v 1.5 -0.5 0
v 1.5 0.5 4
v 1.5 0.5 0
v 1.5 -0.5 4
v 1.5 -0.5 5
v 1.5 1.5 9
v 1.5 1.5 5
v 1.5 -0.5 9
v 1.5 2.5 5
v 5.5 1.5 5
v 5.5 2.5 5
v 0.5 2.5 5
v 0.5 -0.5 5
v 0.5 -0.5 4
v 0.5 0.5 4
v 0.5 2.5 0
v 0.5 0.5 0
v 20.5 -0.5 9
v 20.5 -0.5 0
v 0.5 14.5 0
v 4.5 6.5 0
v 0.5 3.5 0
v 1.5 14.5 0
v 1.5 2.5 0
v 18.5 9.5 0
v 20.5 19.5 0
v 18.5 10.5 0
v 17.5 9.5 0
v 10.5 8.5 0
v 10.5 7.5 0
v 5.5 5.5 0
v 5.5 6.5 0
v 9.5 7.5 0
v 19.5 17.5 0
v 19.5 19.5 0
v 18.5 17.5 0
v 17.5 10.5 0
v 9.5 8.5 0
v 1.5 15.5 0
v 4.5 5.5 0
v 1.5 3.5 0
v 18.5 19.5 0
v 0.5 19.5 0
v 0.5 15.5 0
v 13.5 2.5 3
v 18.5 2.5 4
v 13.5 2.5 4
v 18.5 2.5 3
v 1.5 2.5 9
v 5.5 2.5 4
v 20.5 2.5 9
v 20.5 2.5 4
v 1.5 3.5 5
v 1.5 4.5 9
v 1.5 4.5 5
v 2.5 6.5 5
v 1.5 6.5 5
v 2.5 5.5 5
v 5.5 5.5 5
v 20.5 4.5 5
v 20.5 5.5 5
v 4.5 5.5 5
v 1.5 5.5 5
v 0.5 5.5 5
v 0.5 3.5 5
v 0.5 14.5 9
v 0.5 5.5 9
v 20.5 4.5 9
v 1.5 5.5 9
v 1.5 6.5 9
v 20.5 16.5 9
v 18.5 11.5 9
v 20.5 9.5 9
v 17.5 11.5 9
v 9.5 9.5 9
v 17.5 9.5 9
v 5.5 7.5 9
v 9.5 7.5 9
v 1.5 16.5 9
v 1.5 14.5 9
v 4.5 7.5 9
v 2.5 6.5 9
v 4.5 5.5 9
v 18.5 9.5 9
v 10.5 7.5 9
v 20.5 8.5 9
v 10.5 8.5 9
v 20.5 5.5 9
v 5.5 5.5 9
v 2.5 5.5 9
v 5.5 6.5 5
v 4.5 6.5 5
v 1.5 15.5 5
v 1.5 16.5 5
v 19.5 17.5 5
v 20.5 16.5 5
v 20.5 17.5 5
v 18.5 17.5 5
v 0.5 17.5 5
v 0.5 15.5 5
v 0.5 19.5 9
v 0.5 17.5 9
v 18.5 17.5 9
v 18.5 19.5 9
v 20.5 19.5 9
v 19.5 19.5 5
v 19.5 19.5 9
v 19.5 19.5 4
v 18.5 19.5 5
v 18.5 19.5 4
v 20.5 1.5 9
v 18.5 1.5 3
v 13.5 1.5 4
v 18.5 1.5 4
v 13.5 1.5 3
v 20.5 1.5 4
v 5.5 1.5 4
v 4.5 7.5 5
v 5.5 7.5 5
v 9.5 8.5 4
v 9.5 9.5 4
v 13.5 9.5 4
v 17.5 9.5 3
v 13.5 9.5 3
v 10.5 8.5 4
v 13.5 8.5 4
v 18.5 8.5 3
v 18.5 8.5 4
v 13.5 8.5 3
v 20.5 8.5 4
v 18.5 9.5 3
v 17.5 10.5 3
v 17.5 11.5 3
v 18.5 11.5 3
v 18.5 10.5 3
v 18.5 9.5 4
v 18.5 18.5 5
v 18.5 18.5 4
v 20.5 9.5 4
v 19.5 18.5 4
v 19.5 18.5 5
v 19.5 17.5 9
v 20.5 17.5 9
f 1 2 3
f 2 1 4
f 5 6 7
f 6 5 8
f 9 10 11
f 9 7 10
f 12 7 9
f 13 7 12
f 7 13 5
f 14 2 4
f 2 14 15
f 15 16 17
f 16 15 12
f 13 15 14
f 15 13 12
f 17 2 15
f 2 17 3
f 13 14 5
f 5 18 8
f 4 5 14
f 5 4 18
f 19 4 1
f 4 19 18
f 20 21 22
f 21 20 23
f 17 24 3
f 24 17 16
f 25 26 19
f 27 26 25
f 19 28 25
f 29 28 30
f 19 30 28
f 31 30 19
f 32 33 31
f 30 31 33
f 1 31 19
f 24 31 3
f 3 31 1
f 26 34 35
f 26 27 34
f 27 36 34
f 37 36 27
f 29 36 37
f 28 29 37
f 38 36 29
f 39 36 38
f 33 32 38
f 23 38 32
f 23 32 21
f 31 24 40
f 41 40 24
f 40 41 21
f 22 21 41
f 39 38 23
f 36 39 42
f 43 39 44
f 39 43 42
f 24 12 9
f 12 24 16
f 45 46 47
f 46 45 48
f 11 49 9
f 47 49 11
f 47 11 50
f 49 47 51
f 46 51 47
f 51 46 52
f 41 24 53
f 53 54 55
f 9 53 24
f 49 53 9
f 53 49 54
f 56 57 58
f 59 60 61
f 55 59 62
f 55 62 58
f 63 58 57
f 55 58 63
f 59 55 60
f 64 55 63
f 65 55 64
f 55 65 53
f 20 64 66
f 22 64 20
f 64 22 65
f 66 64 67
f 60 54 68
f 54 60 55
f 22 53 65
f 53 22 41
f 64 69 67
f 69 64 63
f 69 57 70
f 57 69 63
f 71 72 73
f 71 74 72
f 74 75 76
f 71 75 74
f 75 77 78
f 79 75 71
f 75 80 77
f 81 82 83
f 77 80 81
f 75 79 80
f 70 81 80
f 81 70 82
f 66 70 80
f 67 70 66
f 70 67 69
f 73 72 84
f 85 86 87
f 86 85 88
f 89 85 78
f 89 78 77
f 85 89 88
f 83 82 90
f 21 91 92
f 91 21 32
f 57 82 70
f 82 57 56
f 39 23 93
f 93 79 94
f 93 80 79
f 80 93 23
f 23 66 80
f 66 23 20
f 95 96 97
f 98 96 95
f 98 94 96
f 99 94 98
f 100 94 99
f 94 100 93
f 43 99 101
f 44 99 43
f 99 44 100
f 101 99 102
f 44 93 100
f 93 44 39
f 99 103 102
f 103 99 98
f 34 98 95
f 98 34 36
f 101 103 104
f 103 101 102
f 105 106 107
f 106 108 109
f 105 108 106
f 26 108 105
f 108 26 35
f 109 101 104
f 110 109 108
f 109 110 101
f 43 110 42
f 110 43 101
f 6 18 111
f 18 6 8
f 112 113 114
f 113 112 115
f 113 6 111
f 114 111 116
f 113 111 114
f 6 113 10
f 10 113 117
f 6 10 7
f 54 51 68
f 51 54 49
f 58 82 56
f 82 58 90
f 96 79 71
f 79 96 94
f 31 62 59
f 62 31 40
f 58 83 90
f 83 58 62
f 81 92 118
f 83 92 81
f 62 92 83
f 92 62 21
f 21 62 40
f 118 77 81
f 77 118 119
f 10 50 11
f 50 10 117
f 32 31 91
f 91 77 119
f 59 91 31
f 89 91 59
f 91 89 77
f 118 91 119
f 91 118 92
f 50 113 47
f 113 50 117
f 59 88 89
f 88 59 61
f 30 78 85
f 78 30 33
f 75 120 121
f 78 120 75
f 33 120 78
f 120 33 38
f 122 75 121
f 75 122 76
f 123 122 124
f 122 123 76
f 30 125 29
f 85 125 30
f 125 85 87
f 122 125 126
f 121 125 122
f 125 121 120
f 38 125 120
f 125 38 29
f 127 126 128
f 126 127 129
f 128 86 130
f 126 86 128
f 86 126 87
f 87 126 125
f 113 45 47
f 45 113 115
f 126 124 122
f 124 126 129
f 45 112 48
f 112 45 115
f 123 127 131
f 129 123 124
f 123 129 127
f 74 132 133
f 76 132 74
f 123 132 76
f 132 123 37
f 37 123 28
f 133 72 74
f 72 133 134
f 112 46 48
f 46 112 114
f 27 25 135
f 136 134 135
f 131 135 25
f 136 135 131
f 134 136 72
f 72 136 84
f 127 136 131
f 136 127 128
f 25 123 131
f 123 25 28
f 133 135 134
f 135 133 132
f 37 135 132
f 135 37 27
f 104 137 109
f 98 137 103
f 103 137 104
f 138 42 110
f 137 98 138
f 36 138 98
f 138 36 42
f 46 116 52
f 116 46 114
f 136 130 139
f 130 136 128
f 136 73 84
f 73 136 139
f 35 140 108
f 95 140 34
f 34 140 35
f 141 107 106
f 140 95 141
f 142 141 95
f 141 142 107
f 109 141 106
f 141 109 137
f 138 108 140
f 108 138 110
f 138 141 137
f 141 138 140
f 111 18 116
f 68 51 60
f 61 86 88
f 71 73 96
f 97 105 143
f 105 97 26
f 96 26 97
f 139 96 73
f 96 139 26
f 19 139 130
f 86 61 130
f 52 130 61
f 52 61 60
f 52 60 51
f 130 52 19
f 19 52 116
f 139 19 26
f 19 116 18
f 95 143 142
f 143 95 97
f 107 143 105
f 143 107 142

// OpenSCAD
union() {
    translate([1, 0, 4.5]) color([1, 0, 0]) cube([1, 1, 1], center=true);
    translate([1, 1, 2.5]) cube([1, 1, 5], center=true);
    translate([1, 2, 2.5]) cube([1, 1, 5], center=true);
    translate([1, 4, 2.5]) cube([1, 1, 5], center=true);
    translate([1, 5, 2.5]) cube([1, 1, 5], center=true);
    translate([1, 6, 4.5]) cube([1, 1, 9], center=true);
    translate([1, 7, 4.5]) cube([1, 1, 9], center=true);
    translate([1, 8, 4.5]) cube([1, 1, 9], center=true);
    translate([1, 9, 4.5]) cube([1, 1, 9], center=true);
    translate([1, 10, 4.5]) cube([1, 1, 9], center=true);
    translate([1, 11, 4.5]) cube([1, 1, 9], center=true);
    translate([1, 12, 4.5]) cube([1, 1, 9], center=true);
    translate([1, 13, 4.5]) cube([1, 1, 9], center=true);
    translate([1, 14, 4.5]) cube([1, 1, 9], center=true);
    translate([1, 16, 2.5]) cube([1, 1, 5], center=true);
    translate([1, 17, 2.5]) cube([1, 1, 5], center=true);
    translate([1, 18, 4.5]) cube([1, 1, 9], center=true);
    translate([1, 19, 4.5]) cube([1, 1, 9], center=true);
    translate([2, 0, 4.5]) cube([1, 1, 9], center=true);
    translate([2, 1, 4.5]) cube([1, 1, 9], center=true);
    translate([2, 2, 2.5]) cube([1, 1, 5], center=true);
    translate([2, 3, 4.5]) cube([1, 1, 9], center=true);
    translate([2, 4, 4.5]) cube([1, 1, 9], center=true);
    translate([2, 5, 2.5]) cube([1, 1, 5], center=true);
    translate([2, 6, 2.5]) cube([1, 1, 5], center=true);
    translate([2, 7, 4.5]) cube([1, 1, 9], center=true);
    translate([2, 8, 4.5]) cube([1, 1, 9], center=true);
    translate([2, 9, 4.5]) cube([1, 1, 9], center=true);
    translate([2, 10, 4.5]) cube([1, 1, 9], center=true);
    translate([2, 11, 4.5]) cube([1, 1, 9], center=true);
    translate([2, 12, 4.5]) cube([1, 1, 9], center=true);
    translate([2, 13, 4.5]) cube([1, 1, 9], center=true);
    translate([2, 14, 4.5]) cube([1, 1, 9], center=true);
    translate([2, 15, 4.5]) cube([1, 1, 9], center=true);
    translate([2, 16, 4.5]) cube([1, 1, 9], center=true);
    translate([2, 17, 2.5]) cube([1, 1, 5], center=true);
    translate([2, 18, 4.5]) cube([1, 1, 9], center=true);
    translate([2, 19, 4.5]) cube([1, 1, 9], center=true);
    translate([3, 0, 4.5]) cube([1, 1, 9], center=true);
    translate([3, 1, 4.5]) cube([1, 1, 9], center=true);
    translate([3, 2, 2.5]) cube([1, 1, 5], center=true);
    translate([3, 3, 4.5]) cube([1, 1, 9], center=true);
    translate([3, 4, 4.5]) cube([1, 1, 9], center=true);
    translate([3, 5, 2.5]) cube([1, 1, 5], center=true);
    translate([3, 6, 4.5]) cube([1, 1, 9], center=true);
    translate([3, 7, 4.5]) cube([1, 1, 9], center=true);
    translate([3, 8, 4.5]) cube([1, 1, 9], center=true);
    translate([3, 9, 4.5]) cube([1, 1, 9], center=true);
    translate([3, 10, 4.5]) cube([1, 1, 9], center=true);
    translate([3, 11, 4.5]) cube([1, 1, 9], center=true);
    translate([3, 12, 4.5]) cube([1, 1, 9], center=true);
    translate([3, 13, 4.5]) cube([1, 1, 9], center=true);
    translate([3, 14, 4.5]) cube([1, 1, 9], center=true);
    translate([3, 15, 4.5]) cube([1, 1, 9], center=true);
    translate([3, 16, 4.5]) cube([1, 1, 9], center=true);
    translate([3, 17, 2.5]) cube([1, 1, 5], center=true);
    translate([3, 18, 4.5]) cube([1, 1, 9], center=true);
    translate([3, 19, 4.5]) cube([1, 1, 9], center=true);
    translate([4, 0, 4.5]) cube([1, 1, 9], center=true);
    translate([4, 1, 4.5]) cube([1, 1, 9], center=true);
    translate([4, 2, 2.5]) cube([1, 1, 5], center=true);
    translate([4, 3, 4.5]) cube([1, 1, 9], center=true);
    translate([4, 4, 4.5]) cube([1, 1, 9], center=true);
    translate([4, 5, 2.5]) cube([1, 1, 5], center=true);
    translate([4, 6, 4.5]) cube([1, 1, 9], center=true);
    translate([4, 7, 4.5]) cube([1, 1, 9], center=true);
    translate([4, 8, 4.5]) cube([1, 1, 9], center=true);
    translate([4, 9, 4.5]) cube([1, 1, 9], center=true);
    translate([4, 10, 4.5]) cube([1, 1, 9], center=true);
    translate([4, 11, 4.5]) cube([1, 1, 9], center=true);
    translate([4, 12, 4.5]) cube([1, 1, 9], center=true);
    translate([4, 13, 4.5]) cube([1, 1, 9], center=true);
    translate([4, 14, 4.5]) cube([1, 1, 9], center=true);
    translate([4, 15, 4.5]) cube([1, 1, 9], center=true);
    translate([4, 16, 4.5]) cube([1, 1, 9], center=true);
    translate([4, 17, 2.5]) cube([1, 1, 5], center=true);
    translate([4, 18, 4.5]) cube([1, 1, 9], center=true);
    translate([4, 19, 4.5]) cube([1, 1, 9], center=true);
    translate([5, 0, 4.5]) cube([1, 1, 9], center=true);
    translate([5, 1, 4.5]) cube([1, 1, 9], center=true);
    translate([5, 2, 2.5]) cube([1, 1, 5], center=true);
    translate([5, 3, 4.5]) cube([1, 1, 9], center=true);
    translate([5, 4, 4.5]) cube([1, 1, 9], center=true);
    translate([5, 5, 2.5]) cube([1, 1, 5], center=true);
    translate([5, 7, 2.5]) cube([1, 1, 5], center=true);
    translate([5, 8, 4.5]) cube([1, 1, 9], center=true);
    translate([5, 9, 4.5]) cube([1, 1, 9], center=true);
    translate([5, 10, 4.5]) cube([1, 1, 9], center=true);
    translate([5, 11, 4.5]) cube([1, 1, 9], center=true);
    translate([5, 12, 4.5]) cube([1, 1, 9], center=true);
    translate([5, 13, 4.5]) cube([1, 1, 9], center=true);
    translate([5, 14, 4.5]) cube([1, 1, 9], center=true);
    translate([5, 15, 4.5]) cube([1, 1, 9], center=true);
    translate([5, 16, 4.5]) cube([1, 1, 9], center=true);
    translate([5, 17, 2.5]) cube([1, 1, 5], center=true);
    translate([5, 18, 4.5]) cube([1, 1, 9], center=true);
    translate([5, 19, 4.5]) cube([1, 1, 9], center=true);
    translate([6, 0, 4.5]) cube([1, 1, 9], center=true);
    translate([6, 1, 4.5]) cube([1, 1, 9], center=true);
    translate([6, 2, 2.0]) cube([1, 1, 4], center=true);
    translate([6, 3, 4.5]) cube([1, 1, 9], center=true);
    translate([6, 4, 4.5]) cube([1, 1, 9], center=true);
    translate([6, 5, 2.5]) cube([1, 1, 5], center=true);
    translate([6, 6, 4.5]) cube([1, 1, 9], center=true);
    translate([6, 7, 4.5]) cube([1, 1, 9], center=true);
    translate([6, 8, 4.5]) cube([1, 1, 9], center=true);
    translate([6, 9, 4.5]) cube([1, 1, 9], center=true);
    translate([6, 10, 4.5]) cube([1, 1, 9], center=true);
    translate([6, 11, 4.5]) cube([1, 1, 9], center=true);
    translate([6, 12, 4.5]) cube([1, 1, 9], center=true);
    translate([6, 13, 4.5]) cube([1, 1, 9], center=true);
    translate([6, 14, 4.5]) cube([1, 1, 9], center=true);
    translate([6, 15, 4.5]) cube([1, 1, 9], center=true);
    translate([6, 16, 4.5]) cube([1, 1, 9], center=true);
    translate([6, 17, 2.5]) cube([1, 1, 5], center=true);
    translate([6, 18, 4.5]) cube([1, 1, 9], center=true);
    translate([6, 19, 4.5]) cube([1, 1, 9], center=true);
    translate([7, 0, 4.5]) cube([1, 1, 9], center=true);
    translate([7, 1, 4.5]) cube([1, 1, 9], center=true);
    translate([7, 2, 2.0]) cube([1, 1, 4], center=true);
    translate([7, 3, 4.5]) cube([1, 1, 9], center=true);
    translate([7, 4, 4.5]) cube([1, 1, 9], center=true);
    translate([7, 5, 2.5]) cube([1, 1, 5], center=true);
    translate([7, 6, 4.5]) cube([1, 1, 9], center=true);
    translate([7, 7, 4.5]) cube([1, 1, 9], center=true);
    translate([7, 8, 4.5]) cube([1, 1, 9], center=true);
    translate([7, 9, 4.5]) cube([1, 1, 9], center=true);
    translate([7, 10, 4.5]) cube([1, 1, 9], center=true);
    translate([7, 11, 4.5]) cube([1, 1, 9], center=true);
    translate([7, 12, 4.5]) cube([1, 1, 9], center=true);
    translate([7, 13, 4.5]) cube([1, 1, 9], center=true);
    translate([7, 14, 4.5]) cube([1, 1, 9], center=true);
    translate([7, 15, 4.5]) cube([1, 1, 9], center=true);
    translate([7, 16, 4.5]) cube([1, 1, 9], center=true);
    translate([7, 17, 2.5]) cube([1, 1, 5], center=true);
    translate([7, 18, 4.5]) cube([1, 1, 9], center=true);
    translate([7, 19, 4.5]) cube([1, 1, 9], center=true);
    translate([8, 0, 4.5]) cube([1, 1, 9], center=true);
    translate([8, 1, 4.5]) cube([1, 1, 9], center=true);
    translate([8, 2, 2.0]) cube([1, 1, 4], center=true);
    translate([8, 3, 4.5]) cube([1, 1, 9], center=true);
    translate([8, 4, 4.5]) cube([1, 1, 9], center=true);
    translate([8, 5, 2.5]) cube([1, 1, 5], center=true);
    translate([8, 6, 4.5]) cube([1, 1, 9], center=true);
    translate([8, 7, 4.5]) cube([1, 1, 9], center=true);
    translate([8, 8, 4.5]) cube([1, 1, 9], center=true);
    translate([8, 9, 4.5]) cube([1, 1, 9], center=true);
    translate([8, 10, 4.5]) cube([1, 1, 9], center=true);
    translate([8, 11, 4.5]) cube([1, 1, 9], center=true);
    translate([8, 12, 4.5]) cube([1, 1, 9], center=true);
    translate([8, 13, 4.5]) cube([1, 1, 9], center=true);
    translate([8, 14, 4.5]) cube([1, 1, 9], center=true);
    translate([8, 15, 4.5]) cube([1, 1, 9], center=true);
    translate([8, 16, 4.5]) cube([1, 1, 9], center=true);
    translate([8, 17, 2.5]) cube([1, 1, 5], center=true);
    translate([8, 18, 4.5]) cube([1, 1, 9], center=true);
    translate([8, 19, 4.5]) cube([1, 1, 9], center=true);
    translate([9, 0, 4.5]) cube([1, 1, 9], center=true);
    translate([9, 1, 4.5]) cube([1, 1, 9], center=true);
    translate([9, 2, 2.0]) cube([1, 1, 4], center=true);
    translate([9, 3, 4.5]) cube([1, 1, 9], center=true);
    translate([9, 4, 4.5]) cube([1, 1, 9], center=true);
    translate([9, 5, 2.5]) cube([1, 1, 5], center=true);
    translate([9, 6, 4.5]) cube([1, 1, 9], center=true);
    translate([9, 7, 4.5]) cube([1, 1, 9], center=true);
    translate([9, 8, 4.5]) cube([1, 1, 9], center=true);
    translate([9, 9, 4.5]) cube([1, 1, 9], center=true);
    translate([9, 10, 4.5]) cube([1, 1, 9], center=true);
    translate([9, 11, 4.5]) cube([1, 1, 9], center=true);
    translate([9, 12, 4.5]) cube([1, 1, 9], center=true);
    translate([9, 13, 4.5]) cube([1, 1, 9], center=true);
    translate([9, 14, 4.5]) cube([1, 1, 9], center=true);
    translate([9, 15, 4.5]) cube([1, 1, 9], center=true);
    translate([9, 16, 4.5]) cube([1, 1, 9], center=true);
    translate([9, 17, 2.5]) cube([1, 1, 5], center=true);
    translate([9, 18, 4.5]) cube([1, 1, 9], center=true);
    translate([9, 19, 4.5]) cube([1, 1, 9], center=true);
    translate([10, 0, 4.5]) cube([1, 1, 9], center=true);
    translate([10, 1, 4.5]) cube([1, 1, 9], center=true);
    translate([10, 2, 2.0]) cube([1, 1, 4], center=true);
    translate([10, 3, 4.5]) cube([1, 1, 9], center=true);
    translate([10, 4, 4.5]) cube([1, 1, 9], center=true);
    translate([10, 5, 2.5]) cube([1, 1, 5], center=true);
    translate([10, 6, 4.5]) cube([1, 1, 9], center=true);
    translate([10, 7, 4.5]) cube([1, 1, 9], center=true);
    translate([10, 9, 2.0]) cube([1, 1, 4], center=true);
    translate([10, 10, 4.5]) cube([1, 1, 9], center=true);
    translate([10, 11, 4.5]) cube([1, 1, 9], center=true);
    translate([10, 12, 4.5]) cube([1, 1, 9], center=true);
    translate([10, 13, 4.5]) cube([1, 1, 9], center=true);
    translate([10, 14, 4.5]) cube([1, 1, 9], center=true);
    translate([10, 15, 4.5]) cube([1, 1, 9], center=true);
    translate([10, 16, 4.5]) cube([1, 1, 9], center=true);
    translate([10, 17, 2.5]) cube([1, 1, 5], center=true);
    translate([10, 18, 4.5]) cube([1, 1, 9], center=true);
    translate([10, 19, 4.5]) cube([1, 1, 9], center=true);
    translate([11, 0, 4.5]) cube([1, 1, 9], center=true);
    translate([11, 1, 4.5]) cube([1, 1, 9], center=true);
    translate([11, 2, 2.0]) cube([1, 1, 4], center=true);
    translate([11, 3, 4.5]) cube([1, 1, 9], center=true);
    translate([11, 4, 4.5]) cube([1, 1, 9], center=true);
    translate([11, 5, 2.5]) cube([1, 1, 5], center=true);
    translate([11, 6, 4.5]) cube([1, 1, 9], center=true);
    translate([11, 7, 4.5]) cube([1, 1, 9], center=true);
    translate([11, 8, 4.5]) cube([1, 1, 9], center=true);
    translate([11, 9, 2.0]) cube([1, 1, 4], center=true);
    translate([11, 10, 4.5]) cube([1, 1, 9], center=true);
    translate([11, 11, 4.5]) cube([1, 1, 9], center=true);
    translate([11, 12, 4.5]) cube([1, 1, 9], center=true);
    translate([11, 13, 4.5]) cube([1, 1, 9], center=true);
    translate([11, 14, 4.5]) cube([1, 1, 9], center=true);
    translate([11, 15, 4.5]) cube([1, 1, 9], center=true);
    translate([11, 16, 4.5]) cube([1, 1, 9], center=true);
    translate([11, 17, 2.5]) cube([1, 1, 5], center=true);
    translate([11, 18, 4.5]) cube([1, 1, 9], center=true);
    translate([11, 19, 4.5]) cube([1, 1, 9], center=true);
    translate([12, 0, 4.5]) cube([1, 1, 9], center=true);
    translate([12, 1, 4.5]) cube([1, 1, 9], center=true);
    translate([12, 2, 2.0]) cube([1, 1, 4], center=true);
    translate([12, 3, 4.5]) cube([1, 1, 9], center=true);
    translate([12, 4, 4.5]) cube([1, 1, 9], center=true);
    translate([12, 5, 2.5]) cube([1, 1, 5], center=true);
    translate([12, 6, 4.5]) cube([1, 1, 9], center=true);
    translate([12, 7, 4.5]) cube([1, 1, 9], center=true);
    translate([12, 8, 4.5]) cube([1, 1, 9], center=true);
    translate([12, 9, 2.0]) cube([1, 1, 4], center=true);
    translate([12, 10, 4.5]) cube([1, 1, 9], center=true);
    translate([12, 11, 4.5]) cube([1, 1, 9], center=true);
    translate([12, 12, 4.5]) cube([1, 1, 9], center=true);
    translate([12, 13, 4.5]) cube([1, 1, 9], center=true);
    translate([12, 14, 4.5]) cube([1, 1, 9], center=true);
    translate([12, 15, 4.5]) cube([1, 1, 9], center=true);
    translate([12, 16, 4.5]) cube([1, 1, 9], center=true);
    translate([12, 17, 2.5]) cube([1, 1, 5], center=true);
    translate([12, 18, 4.5]) cube([1, 1, 9], center=true);
    translate([12, 19, 4.5]) cube([1, 1, 9], center=true);
    translate([13, 0, 4.5]) cube([1, 1, 9], center=true);
    translate([13, 1, 4.5]) cube([1, 1, 9], center=true);
    translate([13, 2, 2.0]) cube([1, 1, 4], center=true);
    translate([13, 3, 4.5]) cube([1, 1, 9], center=true);
    translate([13, 4, 4.5]) cube([1, 1, 9], center=true);
    translate([13, 5, 2.5]) cube([1, 1, 5], center=true);
    translate([13, 6, 4.5]) cube([1, 1, 9], center=true);
    translate([13, 7, 4.5]) cube([1, 1, 9], center=true);
    translate([13, 8, 4.5]) cube([1, 1, 9], center=true);
    translate([13, 9, 2.0]) cube([1, 1, 4], center=true);
    translate([13, 10, 4.5]) cube([1, 1, 9], center=true);
    translate([13, 11, 4.5]) cube([1, 1, 9], center=true);
    translate([13, 12, 4.5]) cube([1, 1, 9], center=true);
    translate([13, 13, 4.5]) cube([1, 1, 9], center=true);
    translate([13, 14, 4.5]) cube([1, 1, 9], center=true);
    translate([13, 15, 4.5]) cube([1, 1, 9], center=true);
    translate([13, 16, 4.5]) cube([1, 1, 9], center=true);
    translate([13, 17, 2.5]) cube([1, 1, 5], center=true);
    translate([13, 18, 4.5]) cube([1, 1, 9], center=true);
    translate([13, 19, 4.5]) cube([1, 1, 9], center=true);
    translate([14, 0, 4.5]) cube([1, 1, 9], center=true);
    translate([14, 1, 4.5]) cube([1, 1, 9], center=true);
    translate([14, 2, 1.5]) cube([1, 1, 3], center=true);
    translate([14, 3, 4.5]) cube([1, 1, 9], center=true);
    translate([14, 4, 4.5]) cube([1, 1, 9], center=true);
    translate([14, 5, 2.5]) cube([1, 1, 5], center=true);
    translate([14, 6, 4.5]) cube([1, 1, 9], center=true);
    translate([14, 7, 4.5]) cube([1, 1, 9], center=true);
    translate([14, 8, 4.5]) cube([1, 1, 9], center=true);
    translate([14, 9, 1.5]) cube([1, 1, 3], center=true);
    translate([14, 10, 4.5]) cube([1, 1, 9], center=true);
    translate([14, 11, 4.5]) cube([1, 1, 9], center=true);
    translate([14, 12, 4.5]) cube([1, 1, 9], center=true);
    translate([14, 13, 4.5]) cube([1, 1, 9], center=true);
    translate([14, 14, 4.5]) cube([1, 1, 9], center=true);
    translate([14, 15, 4.5]) cube([1, 1, 9], center=true);
    translate([14, 16, 4.5]) cube([1, 1, 9], center=true);
    translate([14, 17, 2.5]) cube([1, 1, 5], center=true);
    translate([14, 18, 4.5]) cube([1, 1, 9], center=true);
    translate([14, 19, 4.5]) cube([1, 1, 9], center=true);
    translate([15, 0, 4.5]) cube([1, 1, 9], center=true);
    translate([15, 1, 4.5]) cube([1, 1, 9], center=true);
    translate([15, 2, 1.5]) cube([1, 1, 3], center=true);
    translate([15, 3, 4.5]) cube([1, 1, 9], center=true);
    translate([15, 4, 4.5]) cube([1, 1, 9], center=true);
    translate([15, 5, 2.5]) cube([1, 1, 5], center=true);
    translate([15, 6, 4.5]) cube([1, 1, 9], center=true);
    translate([15, 7, 4.5]) cube([1, 1, 9], center=true);
    translate([15, 8, 4.5]) cube([1, 1, 9], center=true);
    translate([15, 9, 1.5]) cube([1, 1, 3], center=true);
    translate([15, 10, 4.5]) cube([1, 1, 9], center=true);
    translate([15, 11, 4.5]) cube([1, 1, 9], center=true);
    translate([15, 12, 4.5]) cube([1, 1, 9], center=true);
    translate([15, 13, 4.5]) cube([1, 1, 9], center=true);
    translate([15, 14, 4.5]) cube([1, 1, 9], center=true);
    translate([15, 15, 4.5]) cube([1, 1, 9], center=true);
    translate([15, 16, 4.5]) cube([1, 1, 9], center=true);
    translate([15, 17, 2.5]) cube([1, 1, 5], center=true);
    translate([15, 18, 4.5]) cube([1, 1, 9], center=true);
    translate([15, 19, 4.5]) cube([1, 1, 9], center=true);
    translate([16, 0, 4.5]) cube([1, 1, 9], center=true);
    translate([16, 1, 4.5]) cube([1, 1, 9], center=true);
    translate([16, 2, 1.5]) cube([1, 1, 3], center=true);
    translate([16, 3, 4.5]) cube([1, 1, 9], center=true);
    translate([16, 4, 4.5]) cube([1, 1, 9], center=true);
    translate([16, 5, 2.5]) cube([1, 1, 5], center=true);
    translate([16, 6, 4.5]) cube([1, 1, 9], center=true);
    translate([16, 7, 4.5]) cube([1, 1, 9], center=true);
    translate([16, 8, 4.5]) cube([1, 1, 9], center=true);
    translate([16, 9, 1.5]) cube([1, 1, 3], center=true);
    translate([16, 10, 4.5]) cube([1, 1, 9], center=true);
    translate([16, 11, 4.5]) cube([1, 1, 9], center=true);
    translate([16, 12, 4.5]) cube([1, 1, 9], center=true);
    translate([16, 13, 4.5]) cube([1, 1, 9], center=true);
    translate([16, 14, 4.5]) cube([1, 1, 9], center=true);
    translate([16, 15, 4.5]) cube([1, 1, 9], center=true);
    translate([16, 16, 4.5]) cube([1, 1, 9], center=true);
    translate([16, 17, 2.5]) cube([1, 1, 5], center=true);
    translate([16, 18, 4.5]) cube([1, 1, 9], center=true);
    translate([16, 19, 4.5]) cube([1, 1, 9], center=true);
    translate([17, 0, 4.5]) cube([1, 1, 9], center=true);
    translate([17, 1, 4.5]) cube([1, 1, 9], center=true);
    translate([17, 2, 1.5]) cube([1, 1, 3], center=true);
    translate([17, 3, 4.5]) cube([1, 1, 9], center=true);
    translate([17, 4, 4.5]) cube([1, 1, 9], center=true);
    translate([17, 5, 2.5]) cube([1, 1, 5], center=true);
    translate([17, 6, 4.5]) cube([1, 1, 9], center=true);
    translate([17, 7, 4.5]) cube([1, 1, 9], center=true);
    translate([17, 8, 4.5]) cube([1, 1, 9], center=true);
    translate([17, 9, 1.5]) cube([1, 1, 3], center=true);
    translate([17, 10, 4.5]) cube([1, 1, 9], center=true);
    translate([17, 11, 4.5]) cube([1, 1, 9], center=true);
    translate([17, 12, 4.5]) cube([1, 1, 9], center=true);
    translate([17, 13, 4.5]) cube([1, 1, 9], center=true);
    translate([17, 14, 4.5]) cube([1, 1, 9], center=true);
    translate([17, 15, 4.5]) cube([1, 1, 9], center=true);
    translate([17, 16, 4.5]) cube([1, 1, 9], center=true);
    translate([17, 17, 2.5]) cube([1, 1, 5], center=true);
    translate([17, 18, 4.5]) cube([1, 1, 9], center=true);
    translate([17, 19, 4.5]) cube([1, 1, 9], center=true);
    translate([18, 0, 4.5]) cube([1, 1, 9], center=true);
    translate([18, 1, 4.5]) cube([1, 1, 9], center=true);
    translate([18, 2, 1.5]) cube([1, 1, 3], center=true);
    translate([18, 3, 4.5]) cube([1, 1, 9], center=true);
    translate([18, 4, 4.5]) cube([1, 1, 9], center=true);
    translate([18, 5, 2.5]) cube([1, 1, 5], center=true);
    translate([18, 6, 4.5]) cube([1, 1, 9], center=true);
    translate([18, 7, 4.5]) cube([1, 1, 9], center=true);
    translate([18, 8, 4.5]) cube([1, 1, 9], center=true);
    translate([18, 9, 1.5]) cube([1, 1, 3], center=true);
    translate([18, 11, 1.5]) cube([1, 1, 3], center=true);
    translate([18, 12, 4.5]) cube([1, 1, 9], center=true);
    translate([18, 13, 4.5]) cube([1, 1, 9], center=true);
    translate([18, 14, 4.5]) cube([1, 1, 9], center=true);
    translate([18, 15, 4.5]) cube([1, 1, 9], center=true);
    translate([18, 16, 4.5]) cube([1, 1, 9], center=true);
    translate([18, 17, 2.5]) cube([1, 1, 5], center=true);
    translate([18, 18, 4.5]) cube([1, 1, 9], center=true);
    translate([18, 19, 4.5]) cube([1, 1, 9], center=true);
    translate([19, 0, 4.5]) cube([1, 1, 9], center=true);
    translate([19, 1, 4.5]) cube([1, 1, 9], center=true);
    translate([19, 2, 2.0]) cube([1, 1, 4], center=true);
    translate([19, 3, 4.5]) cube([1, 1, 9], center=true);
    translate([19, 4, 4.5]) cube([1, 1, 9], center=true);
    translate([19, 5, 2.5]) cube([1, 1, 5], center=true);
    translate([19, 6, 4.5]) cube([1, 1, 9], center=true);
    translate([19, 7, 4.5]) cube([1, 1, 9], center=true);
    translate([19, 8, 4.5]) cube([1, 1, 9], center=true);
    translate([19, 9, 2.0]) cube([1, 1, 4], center=true);
    translate([19, 10, 4.5]) cube([1, 1, 9], center=true);
    translate([19, 11, 4.5]) cube([1, 1, 9], center=true);
    translate([19, 12, 4.5]) cube([1, 1, 9], center=true);
    translate([19, 13, 4.5]) cube([1, 1, 9], center=true);
    translate([19, 14, 4.5]) cube([1, 1, 9], center=true);
    translate([19, 15, 4.5]) cube([1, 1, 9], center=true);
    translate([19, 16, 4.5]) cube([1, 1, 9], center=true);
    translate([19, 17, 2.5]) cube([1, 1, 5], center=true);
    translate([19, 19, 4.5]) color([0, 0, 1]) cube([1, 1, 1], center=true);
    translate([20, 0, 4.5]) cube([1, 1, 9], center=true);
    translate([20, 1, 4.5]) cube([1, 1, 9], center=true);
    translate([20, 2, 2.0]) cube([1, 1, 4], center=true);
    translate([20, 3, 4.5]) cube([1, 1, 9], center=true);
    translate([20, 4, 4.5]) cube([1, 1, 9], center=true);
    translate([20, 5, 2.5]) cube([1, 1, 5], center=true);
    translate([20, 6, 4.5]) cube([1, 1, 9], center=true);
    translate([20, 7, 4.5]) cube([1, 1, 9], center=true);
    translate([20, 8, 4.5]) cube([1, 1, 9], center=true);
    translate([20, 9, 2.0]) cube([1, 1, 4], center=true);
    translate([20, 10, 4.5]) cube([1, 1, 9], center=true);
    translate([20, 11, 4.5]) cube([1, 1, 9], center=true);
    translate([20, 12, 4.5]) cube([1, 1, 9], center=true);
    translate([20, 13, 4.5]) cube([1, 1, 9], center=true);
    translate([20, 14, 4.5]) cube([1, 1, 9], center=true);
    translate([20, 15, 4.5]) cube([1, 1, 9], center=true);
    translate([20, 16, 4.5]) cube([1, 1, 9], center=true);
    translate([20, 17, 2.5]) cube([1, 1, 5], center=true);
    translate([20, 18, 4.5]) cube([1, 1, 9], center=true);
    translate([20, 19, 4.5]) cube([1, 1, 9], center=true);
}
